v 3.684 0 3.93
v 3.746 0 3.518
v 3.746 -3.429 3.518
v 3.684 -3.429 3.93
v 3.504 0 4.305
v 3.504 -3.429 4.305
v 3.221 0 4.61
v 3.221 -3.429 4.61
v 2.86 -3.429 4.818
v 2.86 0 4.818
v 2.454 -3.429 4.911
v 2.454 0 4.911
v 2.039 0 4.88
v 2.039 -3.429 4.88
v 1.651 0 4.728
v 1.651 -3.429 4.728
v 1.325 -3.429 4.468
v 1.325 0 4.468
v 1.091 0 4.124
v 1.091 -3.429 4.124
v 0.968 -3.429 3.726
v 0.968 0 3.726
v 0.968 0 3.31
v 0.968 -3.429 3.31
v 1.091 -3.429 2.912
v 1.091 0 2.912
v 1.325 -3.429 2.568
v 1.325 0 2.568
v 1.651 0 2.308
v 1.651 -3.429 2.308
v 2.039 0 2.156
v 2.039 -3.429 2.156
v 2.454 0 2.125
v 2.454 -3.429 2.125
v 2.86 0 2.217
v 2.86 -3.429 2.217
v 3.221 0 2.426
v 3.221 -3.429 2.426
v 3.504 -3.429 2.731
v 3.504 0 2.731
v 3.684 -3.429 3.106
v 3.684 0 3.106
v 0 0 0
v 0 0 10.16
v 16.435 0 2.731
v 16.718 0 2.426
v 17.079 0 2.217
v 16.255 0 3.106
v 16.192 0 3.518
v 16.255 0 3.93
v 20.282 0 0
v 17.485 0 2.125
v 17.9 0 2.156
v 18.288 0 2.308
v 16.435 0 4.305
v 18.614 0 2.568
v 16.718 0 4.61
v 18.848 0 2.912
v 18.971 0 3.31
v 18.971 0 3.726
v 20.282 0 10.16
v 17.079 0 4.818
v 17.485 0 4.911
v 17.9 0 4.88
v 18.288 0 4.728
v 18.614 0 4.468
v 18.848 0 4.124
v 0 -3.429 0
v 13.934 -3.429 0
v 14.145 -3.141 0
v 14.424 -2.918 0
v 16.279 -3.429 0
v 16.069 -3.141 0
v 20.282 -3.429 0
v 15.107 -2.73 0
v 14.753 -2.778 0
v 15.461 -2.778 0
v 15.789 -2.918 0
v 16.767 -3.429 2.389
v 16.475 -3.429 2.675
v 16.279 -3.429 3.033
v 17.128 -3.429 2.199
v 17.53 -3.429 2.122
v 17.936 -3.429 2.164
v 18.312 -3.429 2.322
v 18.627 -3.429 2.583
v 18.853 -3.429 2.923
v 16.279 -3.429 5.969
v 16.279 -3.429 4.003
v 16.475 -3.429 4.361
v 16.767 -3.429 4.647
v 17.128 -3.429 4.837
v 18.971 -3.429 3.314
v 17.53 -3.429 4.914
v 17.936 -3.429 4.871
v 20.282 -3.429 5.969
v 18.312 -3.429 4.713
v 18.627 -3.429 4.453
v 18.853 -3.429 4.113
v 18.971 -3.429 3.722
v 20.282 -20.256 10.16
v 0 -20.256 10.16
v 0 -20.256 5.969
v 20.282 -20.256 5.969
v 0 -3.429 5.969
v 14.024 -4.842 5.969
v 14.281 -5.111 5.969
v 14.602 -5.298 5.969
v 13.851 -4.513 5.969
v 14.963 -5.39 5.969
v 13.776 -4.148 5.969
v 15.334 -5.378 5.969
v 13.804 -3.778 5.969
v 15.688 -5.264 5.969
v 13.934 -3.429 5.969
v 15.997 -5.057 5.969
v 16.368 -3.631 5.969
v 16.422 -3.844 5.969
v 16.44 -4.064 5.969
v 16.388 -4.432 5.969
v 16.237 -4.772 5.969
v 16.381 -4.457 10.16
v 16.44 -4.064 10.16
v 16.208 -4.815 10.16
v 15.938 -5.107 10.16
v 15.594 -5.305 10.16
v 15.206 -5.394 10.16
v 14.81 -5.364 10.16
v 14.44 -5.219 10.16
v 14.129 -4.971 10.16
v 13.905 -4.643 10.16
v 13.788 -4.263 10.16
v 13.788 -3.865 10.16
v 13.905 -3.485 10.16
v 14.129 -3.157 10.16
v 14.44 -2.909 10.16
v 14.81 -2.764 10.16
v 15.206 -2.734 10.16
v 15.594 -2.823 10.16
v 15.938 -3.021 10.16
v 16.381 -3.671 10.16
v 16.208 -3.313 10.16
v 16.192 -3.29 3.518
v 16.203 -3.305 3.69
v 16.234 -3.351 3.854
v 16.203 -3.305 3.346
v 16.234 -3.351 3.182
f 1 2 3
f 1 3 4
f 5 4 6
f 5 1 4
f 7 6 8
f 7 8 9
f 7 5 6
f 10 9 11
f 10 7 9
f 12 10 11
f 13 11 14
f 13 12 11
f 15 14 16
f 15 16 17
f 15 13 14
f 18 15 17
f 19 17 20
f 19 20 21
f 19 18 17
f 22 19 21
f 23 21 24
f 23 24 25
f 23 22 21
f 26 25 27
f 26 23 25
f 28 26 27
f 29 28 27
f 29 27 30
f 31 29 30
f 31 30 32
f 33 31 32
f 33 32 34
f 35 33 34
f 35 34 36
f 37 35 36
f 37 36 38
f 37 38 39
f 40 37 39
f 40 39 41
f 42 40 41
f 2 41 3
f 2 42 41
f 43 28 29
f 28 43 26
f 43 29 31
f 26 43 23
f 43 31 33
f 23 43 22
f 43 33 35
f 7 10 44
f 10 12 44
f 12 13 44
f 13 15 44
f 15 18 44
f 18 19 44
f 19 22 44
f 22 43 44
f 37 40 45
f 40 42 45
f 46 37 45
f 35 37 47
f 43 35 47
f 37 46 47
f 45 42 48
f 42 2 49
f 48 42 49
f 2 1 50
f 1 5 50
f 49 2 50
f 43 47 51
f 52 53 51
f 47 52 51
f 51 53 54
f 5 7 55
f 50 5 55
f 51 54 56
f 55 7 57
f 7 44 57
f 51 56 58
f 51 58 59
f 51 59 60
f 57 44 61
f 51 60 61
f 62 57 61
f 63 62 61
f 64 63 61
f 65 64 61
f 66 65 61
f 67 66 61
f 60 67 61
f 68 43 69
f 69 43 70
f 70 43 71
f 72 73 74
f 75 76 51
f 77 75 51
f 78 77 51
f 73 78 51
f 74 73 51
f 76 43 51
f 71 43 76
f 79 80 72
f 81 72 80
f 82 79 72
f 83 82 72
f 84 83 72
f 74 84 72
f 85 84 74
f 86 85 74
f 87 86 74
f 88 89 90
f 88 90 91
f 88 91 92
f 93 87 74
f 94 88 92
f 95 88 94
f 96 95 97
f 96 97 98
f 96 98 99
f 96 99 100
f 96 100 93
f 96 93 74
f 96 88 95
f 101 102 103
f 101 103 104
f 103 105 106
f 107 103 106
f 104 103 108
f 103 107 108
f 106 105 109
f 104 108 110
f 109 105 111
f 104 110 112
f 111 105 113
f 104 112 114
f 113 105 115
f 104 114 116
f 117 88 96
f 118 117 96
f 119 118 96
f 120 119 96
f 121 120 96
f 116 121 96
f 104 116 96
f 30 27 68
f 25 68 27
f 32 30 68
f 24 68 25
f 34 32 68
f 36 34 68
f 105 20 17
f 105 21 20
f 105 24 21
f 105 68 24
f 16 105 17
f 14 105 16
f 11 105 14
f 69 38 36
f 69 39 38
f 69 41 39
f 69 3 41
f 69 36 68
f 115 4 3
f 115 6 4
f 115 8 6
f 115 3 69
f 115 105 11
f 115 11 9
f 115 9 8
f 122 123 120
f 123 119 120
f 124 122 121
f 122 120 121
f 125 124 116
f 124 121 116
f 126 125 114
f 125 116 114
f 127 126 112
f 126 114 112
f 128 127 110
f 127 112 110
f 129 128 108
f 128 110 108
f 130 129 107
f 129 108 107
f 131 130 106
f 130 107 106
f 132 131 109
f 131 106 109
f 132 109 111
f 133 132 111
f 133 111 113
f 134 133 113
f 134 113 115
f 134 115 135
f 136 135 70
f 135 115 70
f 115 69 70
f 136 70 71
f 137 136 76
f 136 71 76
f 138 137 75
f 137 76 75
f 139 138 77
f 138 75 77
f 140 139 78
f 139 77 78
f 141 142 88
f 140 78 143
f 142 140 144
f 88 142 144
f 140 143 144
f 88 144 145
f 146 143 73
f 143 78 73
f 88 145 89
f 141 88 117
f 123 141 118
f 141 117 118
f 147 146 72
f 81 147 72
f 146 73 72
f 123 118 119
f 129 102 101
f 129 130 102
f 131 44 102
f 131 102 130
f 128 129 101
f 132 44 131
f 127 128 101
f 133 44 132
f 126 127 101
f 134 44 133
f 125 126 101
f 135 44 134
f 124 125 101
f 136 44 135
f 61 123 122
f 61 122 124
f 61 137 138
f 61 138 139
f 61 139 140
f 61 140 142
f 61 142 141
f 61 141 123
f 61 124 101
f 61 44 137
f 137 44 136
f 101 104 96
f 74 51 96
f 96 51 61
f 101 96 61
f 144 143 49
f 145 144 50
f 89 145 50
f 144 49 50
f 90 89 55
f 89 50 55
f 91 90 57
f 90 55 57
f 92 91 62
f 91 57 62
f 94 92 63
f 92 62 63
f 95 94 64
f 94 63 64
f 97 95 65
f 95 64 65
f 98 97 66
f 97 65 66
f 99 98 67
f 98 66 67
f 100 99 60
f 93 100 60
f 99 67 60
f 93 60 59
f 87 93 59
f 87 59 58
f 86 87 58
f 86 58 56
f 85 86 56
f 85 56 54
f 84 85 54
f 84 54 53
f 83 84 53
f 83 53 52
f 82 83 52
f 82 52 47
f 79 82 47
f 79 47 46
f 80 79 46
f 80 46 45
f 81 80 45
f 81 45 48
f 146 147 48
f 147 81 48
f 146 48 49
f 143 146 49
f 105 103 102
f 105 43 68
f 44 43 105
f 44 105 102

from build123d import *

# Parameters (mm, degrees)
F0_R     = 1.397
F1_DEPTH = 3.429
F2_W     = 20.2819
F2_H     = 4.191
F3_DEPTH = 16.8275
F4_R     = 1.3335
F5_DEPTH = 12.7


with BuildPart() as f1:
    # F0 (on Front) → F1 (new body)
    with BuildSketch(Plane.XZ):
        Polygon((0, 10.16), (0, 0), (20.2819, 0), (20.2819, 10.16), (10.14095, 10.16), align=None)
        with Locations((2.3495, 3.5179)):
            Circle(F0_R, mode=Mode.SUBTRACT)
        with BuildLine():
            ThreePointArc((18.9865, 3.5179), (17.5895, 2.1209), (16.1925, 3.5179))
            ThreePointArc((16.1925, 3.5179), (17.5895, 4.9149), (18.9865, 3.5179))
        make_face(mode=Mode.SUBTRACT)
    extrude(amount=F1_DEPTH)

    # F2 (on face) → F3 (join)
    with BuildSketch(Plane.XZ.offset(3.429)):
        with Locations((10.14095, 8.0645)):
            Rectangle(F2_W, F2_H)
    extrude(amount=F3_DEPTH)

    # F4 (on face) → F5 (cut, symmetric)
    with BuildSketch(Plane(origin=(0, 0, 5.969), x_dir=(1, 0, 0), z_dir=(0, 0, -1))):
        with Locations((15.10665, 4.064)):
            Circle(F4_R)
    extrude(amount=F5_DEPTH, both=True, mode=Mode.SUBTRACT)


solid = f1.part
